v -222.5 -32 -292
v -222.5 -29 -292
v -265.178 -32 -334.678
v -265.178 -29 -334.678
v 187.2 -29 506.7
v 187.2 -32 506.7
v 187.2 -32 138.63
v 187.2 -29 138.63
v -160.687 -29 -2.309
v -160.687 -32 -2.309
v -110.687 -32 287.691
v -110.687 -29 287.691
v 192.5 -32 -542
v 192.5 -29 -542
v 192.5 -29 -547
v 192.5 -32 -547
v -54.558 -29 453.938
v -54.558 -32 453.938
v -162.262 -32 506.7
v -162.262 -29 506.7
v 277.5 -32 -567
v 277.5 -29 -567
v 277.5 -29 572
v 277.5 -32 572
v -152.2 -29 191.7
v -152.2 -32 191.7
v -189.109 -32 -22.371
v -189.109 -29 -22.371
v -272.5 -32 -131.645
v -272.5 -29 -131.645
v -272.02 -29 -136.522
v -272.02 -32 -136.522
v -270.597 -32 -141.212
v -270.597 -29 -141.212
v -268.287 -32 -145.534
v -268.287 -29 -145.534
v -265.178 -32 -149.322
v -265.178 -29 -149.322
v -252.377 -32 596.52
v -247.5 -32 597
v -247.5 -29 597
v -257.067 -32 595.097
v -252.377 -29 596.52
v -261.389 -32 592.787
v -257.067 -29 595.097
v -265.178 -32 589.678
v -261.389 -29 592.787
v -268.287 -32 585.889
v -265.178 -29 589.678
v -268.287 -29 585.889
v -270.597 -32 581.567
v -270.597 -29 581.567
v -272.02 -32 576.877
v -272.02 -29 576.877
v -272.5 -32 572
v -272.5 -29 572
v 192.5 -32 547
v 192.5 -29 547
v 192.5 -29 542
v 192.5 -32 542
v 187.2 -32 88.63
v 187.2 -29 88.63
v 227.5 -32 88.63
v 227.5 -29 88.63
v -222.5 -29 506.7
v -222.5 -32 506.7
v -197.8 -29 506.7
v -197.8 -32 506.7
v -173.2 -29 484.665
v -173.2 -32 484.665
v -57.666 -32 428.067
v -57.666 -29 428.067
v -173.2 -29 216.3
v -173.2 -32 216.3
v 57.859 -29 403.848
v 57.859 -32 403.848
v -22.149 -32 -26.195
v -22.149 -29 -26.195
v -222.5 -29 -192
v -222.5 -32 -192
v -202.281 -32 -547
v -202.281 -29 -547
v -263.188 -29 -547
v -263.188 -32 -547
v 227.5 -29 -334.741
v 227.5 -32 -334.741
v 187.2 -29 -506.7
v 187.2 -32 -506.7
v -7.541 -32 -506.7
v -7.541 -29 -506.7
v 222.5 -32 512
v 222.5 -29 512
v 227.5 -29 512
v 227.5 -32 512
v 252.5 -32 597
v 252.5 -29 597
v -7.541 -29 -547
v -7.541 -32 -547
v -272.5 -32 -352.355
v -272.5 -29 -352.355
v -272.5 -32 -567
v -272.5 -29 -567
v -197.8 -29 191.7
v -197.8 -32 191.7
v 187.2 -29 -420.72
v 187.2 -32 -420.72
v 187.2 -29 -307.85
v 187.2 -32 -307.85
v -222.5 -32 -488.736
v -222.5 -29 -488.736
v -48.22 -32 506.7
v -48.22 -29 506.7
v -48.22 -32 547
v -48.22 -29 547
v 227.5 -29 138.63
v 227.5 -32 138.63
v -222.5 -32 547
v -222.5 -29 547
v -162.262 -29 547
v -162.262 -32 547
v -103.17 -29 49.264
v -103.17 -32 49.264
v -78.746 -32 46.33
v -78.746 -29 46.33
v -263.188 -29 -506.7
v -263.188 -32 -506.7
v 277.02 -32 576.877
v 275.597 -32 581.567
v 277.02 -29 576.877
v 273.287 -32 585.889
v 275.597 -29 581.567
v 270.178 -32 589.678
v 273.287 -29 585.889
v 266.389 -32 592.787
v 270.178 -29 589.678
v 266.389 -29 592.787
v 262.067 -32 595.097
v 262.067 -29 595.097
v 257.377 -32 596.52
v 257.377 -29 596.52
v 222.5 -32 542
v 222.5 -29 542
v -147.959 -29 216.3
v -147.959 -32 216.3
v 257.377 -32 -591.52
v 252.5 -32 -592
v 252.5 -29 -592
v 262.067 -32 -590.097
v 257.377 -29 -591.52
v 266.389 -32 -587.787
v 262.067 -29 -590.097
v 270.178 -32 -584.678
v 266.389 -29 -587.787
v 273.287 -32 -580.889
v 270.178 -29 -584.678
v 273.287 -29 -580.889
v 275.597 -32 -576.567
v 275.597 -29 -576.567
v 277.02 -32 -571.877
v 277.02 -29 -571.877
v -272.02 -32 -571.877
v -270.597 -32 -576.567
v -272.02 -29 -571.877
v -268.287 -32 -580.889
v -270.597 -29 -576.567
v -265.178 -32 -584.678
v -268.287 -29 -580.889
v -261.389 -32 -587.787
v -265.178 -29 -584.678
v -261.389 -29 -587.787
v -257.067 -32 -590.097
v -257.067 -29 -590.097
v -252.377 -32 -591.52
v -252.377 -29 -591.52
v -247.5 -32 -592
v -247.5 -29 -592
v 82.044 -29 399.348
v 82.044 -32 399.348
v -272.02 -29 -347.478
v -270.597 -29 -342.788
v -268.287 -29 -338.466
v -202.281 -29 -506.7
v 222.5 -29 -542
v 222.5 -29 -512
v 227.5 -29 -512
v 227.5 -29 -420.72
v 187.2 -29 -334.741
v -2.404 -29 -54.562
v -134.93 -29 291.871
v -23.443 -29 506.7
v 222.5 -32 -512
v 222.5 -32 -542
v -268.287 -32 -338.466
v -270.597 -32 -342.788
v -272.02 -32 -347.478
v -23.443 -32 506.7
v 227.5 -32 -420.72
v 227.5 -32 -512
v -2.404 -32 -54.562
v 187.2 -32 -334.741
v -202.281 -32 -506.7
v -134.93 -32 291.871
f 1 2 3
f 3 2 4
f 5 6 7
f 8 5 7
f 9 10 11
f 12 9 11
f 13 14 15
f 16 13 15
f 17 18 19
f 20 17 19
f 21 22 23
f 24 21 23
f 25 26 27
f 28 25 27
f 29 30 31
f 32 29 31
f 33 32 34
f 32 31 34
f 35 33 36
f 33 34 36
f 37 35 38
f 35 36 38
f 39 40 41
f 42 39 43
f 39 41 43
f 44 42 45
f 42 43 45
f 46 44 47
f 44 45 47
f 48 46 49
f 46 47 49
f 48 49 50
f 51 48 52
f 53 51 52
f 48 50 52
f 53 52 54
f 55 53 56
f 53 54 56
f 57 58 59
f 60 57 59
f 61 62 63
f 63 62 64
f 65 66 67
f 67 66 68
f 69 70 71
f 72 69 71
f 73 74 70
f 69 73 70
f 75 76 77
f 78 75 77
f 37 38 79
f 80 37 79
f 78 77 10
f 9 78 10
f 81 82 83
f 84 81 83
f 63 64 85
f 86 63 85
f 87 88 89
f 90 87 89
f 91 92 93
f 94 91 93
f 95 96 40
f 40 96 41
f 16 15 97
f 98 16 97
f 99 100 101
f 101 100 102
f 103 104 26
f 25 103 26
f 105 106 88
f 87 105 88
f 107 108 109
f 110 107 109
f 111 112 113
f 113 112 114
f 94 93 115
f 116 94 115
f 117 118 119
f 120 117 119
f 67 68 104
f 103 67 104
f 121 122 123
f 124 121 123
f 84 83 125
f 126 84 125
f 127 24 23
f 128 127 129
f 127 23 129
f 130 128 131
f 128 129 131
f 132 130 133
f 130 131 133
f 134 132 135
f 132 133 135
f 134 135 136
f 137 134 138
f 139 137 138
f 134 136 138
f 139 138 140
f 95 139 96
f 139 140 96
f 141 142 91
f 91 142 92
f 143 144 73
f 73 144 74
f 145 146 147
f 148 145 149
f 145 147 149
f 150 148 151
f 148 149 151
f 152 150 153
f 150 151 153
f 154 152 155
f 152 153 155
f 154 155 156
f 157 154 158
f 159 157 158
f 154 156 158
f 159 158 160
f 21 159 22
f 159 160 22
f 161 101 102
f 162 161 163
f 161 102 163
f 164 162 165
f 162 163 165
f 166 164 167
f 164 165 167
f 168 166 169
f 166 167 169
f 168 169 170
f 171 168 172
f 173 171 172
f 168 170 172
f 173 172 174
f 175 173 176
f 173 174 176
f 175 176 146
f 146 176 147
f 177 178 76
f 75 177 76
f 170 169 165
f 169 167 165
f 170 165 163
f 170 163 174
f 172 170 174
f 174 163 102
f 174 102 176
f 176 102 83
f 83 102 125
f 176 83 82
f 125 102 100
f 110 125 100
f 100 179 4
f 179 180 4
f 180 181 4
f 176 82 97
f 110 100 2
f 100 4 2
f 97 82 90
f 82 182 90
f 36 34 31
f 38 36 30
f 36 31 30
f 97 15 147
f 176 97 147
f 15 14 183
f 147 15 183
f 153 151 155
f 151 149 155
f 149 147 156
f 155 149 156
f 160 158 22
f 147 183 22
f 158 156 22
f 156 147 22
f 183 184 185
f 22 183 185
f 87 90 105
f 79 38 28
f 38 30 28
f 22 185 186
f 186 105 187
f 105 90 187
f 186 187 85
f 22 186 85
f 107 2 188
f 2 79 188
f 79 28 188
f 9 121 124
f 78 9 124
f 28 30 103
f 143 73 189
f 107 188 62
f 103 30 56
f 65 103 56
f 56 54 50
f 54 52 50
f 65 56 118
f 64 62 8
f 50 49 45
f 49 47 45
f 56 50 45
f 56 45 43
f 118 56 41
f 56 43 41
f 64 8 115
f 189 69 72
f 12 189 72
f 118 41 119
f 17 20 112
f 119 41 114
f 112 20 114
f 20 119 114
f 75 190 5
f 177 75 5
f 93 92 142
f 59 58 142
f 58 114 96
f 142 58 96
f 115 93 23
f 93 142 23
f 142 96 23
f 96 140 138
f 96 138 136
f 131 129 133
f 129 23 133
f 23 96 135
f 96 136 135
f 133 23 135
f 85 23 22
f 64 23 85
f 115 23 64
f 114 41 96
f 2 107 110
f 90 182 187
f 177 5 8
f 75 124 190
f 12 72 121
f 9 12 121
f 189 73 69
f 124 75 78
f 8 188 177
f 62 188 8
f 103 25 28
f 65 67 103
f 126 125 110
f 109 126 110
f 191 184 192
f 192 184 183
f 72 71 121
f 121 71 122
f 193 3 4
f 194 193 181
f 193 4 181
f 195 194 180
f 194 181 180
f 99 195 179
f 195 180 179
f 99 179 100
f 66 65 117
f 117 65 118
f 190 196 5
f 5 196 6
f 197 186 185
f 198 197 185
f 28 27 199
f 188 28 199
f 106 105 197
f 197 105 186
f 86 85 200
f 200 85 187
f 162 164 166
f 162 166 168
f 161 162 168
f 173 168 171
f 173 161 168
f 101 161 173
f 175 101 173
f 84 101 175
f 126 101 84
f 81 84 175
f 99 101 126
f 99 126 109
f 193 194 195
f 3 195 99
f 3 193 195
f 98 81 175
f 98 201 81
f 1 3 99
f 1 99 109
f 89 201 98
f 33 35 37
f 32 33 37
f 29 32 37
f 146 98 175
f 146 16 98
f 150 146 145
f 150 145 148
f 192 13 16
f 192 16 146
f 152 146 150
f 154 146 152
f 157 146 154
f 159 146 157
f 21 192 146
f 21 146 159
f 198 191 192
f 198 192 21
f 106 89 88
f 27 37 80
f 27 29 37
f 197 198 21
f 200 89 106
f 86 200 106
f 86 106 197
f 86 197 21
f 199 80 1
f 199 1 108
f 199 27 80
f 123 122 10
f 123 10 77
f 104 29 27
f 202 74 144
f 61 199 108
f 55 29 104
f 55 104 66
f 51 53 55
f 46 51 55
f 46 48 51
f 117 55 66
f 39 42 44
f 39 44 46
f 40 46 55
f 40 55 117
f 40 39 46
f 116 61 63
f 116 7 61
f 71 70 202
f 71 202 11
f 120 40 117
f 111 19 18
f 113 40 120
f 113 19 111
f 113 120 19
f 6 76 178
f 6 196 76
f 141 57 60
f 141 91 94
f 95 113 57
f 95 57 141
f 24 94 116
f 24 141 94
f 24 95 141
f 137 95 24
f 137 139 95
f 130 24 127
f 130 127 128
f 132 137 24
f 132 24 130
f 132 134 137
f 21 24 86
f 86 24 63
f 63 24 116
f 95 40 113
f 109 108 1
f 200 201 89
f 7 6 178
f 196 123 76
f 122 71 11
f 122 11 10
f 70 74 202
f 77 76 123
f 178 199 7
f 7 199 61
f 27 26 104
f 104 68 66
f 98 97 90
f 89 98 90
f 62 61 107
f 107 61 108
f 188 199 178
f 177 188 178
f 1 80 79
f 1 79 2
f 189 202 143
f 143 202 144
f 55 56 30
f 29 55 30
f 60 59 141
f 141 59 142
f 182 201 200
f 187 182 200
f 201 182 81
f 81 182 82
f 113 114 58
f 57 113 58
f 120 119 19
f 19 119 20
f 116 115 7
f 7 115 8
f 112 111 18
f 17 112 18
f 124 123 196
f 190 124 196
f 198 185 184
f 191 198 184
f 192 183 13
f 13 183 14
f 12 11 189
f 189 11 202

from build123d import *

# Parameters (mm, degrees)
F0_W          = 445
F0_H          = 1084
F1_DEPTH      = 32
F3_DEPTH      = 10
F5_DEPTH      = 10
F7_DEPTH      = 22
F7_DEPTH_BACK = 10
F8_W          = 550
F8_H          = 29
F9_DEPTH      = 1189.001


with BuildPart() as f1:
    # F0 (on Front) → F1 (new body)
    with BuildSketch(Plane.XZ):
        Rectangle(F0_W, F0_H)
    extrude(amount=F1_DEPTH)

    # F2 (on face) → F3 (cut)
    with BuildSketch(Plane.XZ.offset(32)):
        Polygon((-19.5, -30), (-22.7926296995, -47.6978846347), (-5.0528002133, -50.7564759254), (78.1963408907, 396.7076575087), (60.5, 400), align=None)
        Polygon((222.5, -542), (222.5, -510), (190.5, -510), (-217.9259726344, -510), (-222.5, -512.0194736094), (-222.5, -542), align=None)
        Polygon((-145.1793725139, 213), (-148.2828207898, 195), (-185.2966065805, -19.6799575863), (-167.5583244971, -22.7382820834), (-164.5, -5), (-114.5, 285), (-132.2382820834, 288.0583244971), align=None)
        Polygon((-164.5, -5), (-167.5583244971, -22.7382820834), (-22.7926296995, -47.6978846347), (-19.5, -30), align=None)
        Polygon((-176.5, 213), (-176.5, 195), (-148.2828207898, 195), (-145.1793725139, 213), align=None)
        Polygon((-176.5, 510), (-194.5, 510), (-194.5, 195), (-176.5, 195), (-176.5, 213), (-176.5, 489.9562019444), align=None)
        Polygon((-81.6284831041, 50), (-26.3705931966, 510), (-44.5, 510), (-51.8361056045, 448.9298327582), (-54.11006781, 430), (-99.5, 52.1468311155), align=None)
        Polygon((-51.8361056045, 448.9298327582), (-176.5, 510), (-176.5, 489.9562019444), (-54.11006781, 430), align=None)
        Polygon((222.5, 542), (-222.5, 542), (-222.5, 510), (-194.5, 510), (-176.5, 510), (-44.5, 510), (-26.3705931966, 510), (190.5, 510), (222.5, 510), align=None)
        Polygon((222.5, -510), (222.5, 510), (190.5, 510), (190.5, -310), (190.5, -329.6763142865), (190.5, -510), align=None)
        Polygon((-222.5, -512.0194736094), (-222.5, -492.3431593229), (-366.9909259611, -556.1371833743), (-359.7208209674, -572.6036818904), align=None)
        Polygon((190.5, -310), (-222.5, -492.3431593229), (-222.5, -512.0194736094), (-217.9259726344, -510), (190.5, -329.6763142865), align=None)
    extrude(amount=-F3_DEPTH, mode=Mode.SUBTRACT)

    # F4 (on face) → F5 (cut, through all)
    with BuildSketch(Plane.XZ.offset(32)):
        Polygon((-222.5, 542), (-222.5, 506.7), (-197.8, 506.7), (-197.8, 191.7), (-152.2004758656, 191.7), (-189.109317787, -22.3712831437), (-2.4041469191, -54.5618298451), (82.0442661774, 399.3483905486), (57.8592669601, 403.8479252867), (-22.1486532942, -26.1946460803), (-160.6872887936, -2.3086744425), (-110.6872887936, 287.6913255575), (-134.9296076409, 291.8710357036), (-147.9590965553, 216.3), (-173.2, 216.3), (-173.2, 484.6649064346), (-57.665964291, 428.0672610853), (-103.1700304688, 49.2639720557), (-78.7456240443, 46.3299695312), (-23.4432839132, 506.7), (187.2, 506.7), (187.2, -307.8496549533), (-222.5, -488.7358350371), (-222.5, -542), (222.5, -542), (222.5, 542), align=None)
        Polygon((-202.2811579858, -506.7), (187.2, -334.7406178115), (187.2, -506.7), align=None, mode=Mode.SUBTRACT)
        Polygon((-54.5582159435, 453.9380325215), (-162.2623968703, 506.7), (-48.2201398778, 506.7), align=None, mode=Mode.SUBTRACT)
    extrude(amount=-F5_DEPTH, mode=Mode.SUBTRACT)

    # F6 (on face) → F7 (join, two sides)
    with BuildSketch(Plane.XZ.offset(22)) as f7_sk:
        with BuildLine():
            Line((-222.5, -192), (-222.5, -292))
            Line((-222.5, -292), (-265.1776695297, -334.6776695297))
            ThreePointArc((-265.1776695297, -334.6776695297), (-270.5969883128, -342.7882532502), (-272.5, -352.3553390593))
            Line((-272.5, -352.3553390593), (-272.5, -567))
            ThreePointArc((-272.5, -567), (-265.1776695297, -584.6776695297), (-247.5, -592))
            Line((-247.5, -592), (252.5, -592))
            ThreePointArc((252.5, -592), (270.1776695297, -584.6776695297), (277.5, -567))
            Line((277.5, -567), (277.5, 572))
            ThreePointArc((277.5, 572), (270.1776695297, 589.6776695297), (252.5, 597))
            Line((252.5, 597), (-247.5, 597))
            ThreePointArc((-247.5, 597), (-265.1776695297, 589.6776695297), (-272.5, 572))
            Line((-272.5, 572), (-272.5, -131.6446609407))
            ThreePointArc((-272.5, -131.6446609407), (-270.5969883128, -141.2117467498), (-265.1776695297, -149.3223304703))
            Line((-265.1776695297, -149.3223304703), (-222.5, -192))
        make_face()
        Polygon((-162.2623968703, 547), (-162.2623968703, 506.7), (-48.2201398778, 506.7), (-48.2201398778, 547), (192.5, 547), (192.5, 542), (222.5, 542), (222.5, 512), (227.5, 512), (227.5, 138.6296910943), (187.2, 138.6296910943), (187.2, 88.6296910943), (227.5, 88.6296910943), (227.5, -334.7406178115), (187.2, -334.7406178115), (187.2, -420.7203089057), (227.5, -420.7203089057), (227.5, -512), (222.5, -512), (222.5, -542), (192.5, -542), (192.5, -547), (-7.5405789929, -547), (-7.5405789929, -506.7), (-202.2811579858, -506.7), (-202.2811579858, -547), (-263.1881188044, -547), (-263.1881188044, -506.7), (-222.5, -488.7358350371), (-222.5, -398.0570733547), (-146.2218463421, -398.0570733547), (-146.2218463421, -83.5470482707), (-222.5, -83.5470482707), (-222.5, 547), align=None, mode=Mode.SUBTRACT)
    extrude(amount=-F7_DEPTH)
    extrude(f7_sk.sketch, amount=F7_DEPTH_BACK)

    # F8 (on face) → F9 (cut, through all)
    with BuildSketch(Plane.XY.offset(597)):
        with Locations((2.5, -14.5)):
            Rectangle(F8_W, F8_H)
    extrude(amount=-F9_DEPTH, mode=Mode.SUBTRACT)


solid = f1.part
